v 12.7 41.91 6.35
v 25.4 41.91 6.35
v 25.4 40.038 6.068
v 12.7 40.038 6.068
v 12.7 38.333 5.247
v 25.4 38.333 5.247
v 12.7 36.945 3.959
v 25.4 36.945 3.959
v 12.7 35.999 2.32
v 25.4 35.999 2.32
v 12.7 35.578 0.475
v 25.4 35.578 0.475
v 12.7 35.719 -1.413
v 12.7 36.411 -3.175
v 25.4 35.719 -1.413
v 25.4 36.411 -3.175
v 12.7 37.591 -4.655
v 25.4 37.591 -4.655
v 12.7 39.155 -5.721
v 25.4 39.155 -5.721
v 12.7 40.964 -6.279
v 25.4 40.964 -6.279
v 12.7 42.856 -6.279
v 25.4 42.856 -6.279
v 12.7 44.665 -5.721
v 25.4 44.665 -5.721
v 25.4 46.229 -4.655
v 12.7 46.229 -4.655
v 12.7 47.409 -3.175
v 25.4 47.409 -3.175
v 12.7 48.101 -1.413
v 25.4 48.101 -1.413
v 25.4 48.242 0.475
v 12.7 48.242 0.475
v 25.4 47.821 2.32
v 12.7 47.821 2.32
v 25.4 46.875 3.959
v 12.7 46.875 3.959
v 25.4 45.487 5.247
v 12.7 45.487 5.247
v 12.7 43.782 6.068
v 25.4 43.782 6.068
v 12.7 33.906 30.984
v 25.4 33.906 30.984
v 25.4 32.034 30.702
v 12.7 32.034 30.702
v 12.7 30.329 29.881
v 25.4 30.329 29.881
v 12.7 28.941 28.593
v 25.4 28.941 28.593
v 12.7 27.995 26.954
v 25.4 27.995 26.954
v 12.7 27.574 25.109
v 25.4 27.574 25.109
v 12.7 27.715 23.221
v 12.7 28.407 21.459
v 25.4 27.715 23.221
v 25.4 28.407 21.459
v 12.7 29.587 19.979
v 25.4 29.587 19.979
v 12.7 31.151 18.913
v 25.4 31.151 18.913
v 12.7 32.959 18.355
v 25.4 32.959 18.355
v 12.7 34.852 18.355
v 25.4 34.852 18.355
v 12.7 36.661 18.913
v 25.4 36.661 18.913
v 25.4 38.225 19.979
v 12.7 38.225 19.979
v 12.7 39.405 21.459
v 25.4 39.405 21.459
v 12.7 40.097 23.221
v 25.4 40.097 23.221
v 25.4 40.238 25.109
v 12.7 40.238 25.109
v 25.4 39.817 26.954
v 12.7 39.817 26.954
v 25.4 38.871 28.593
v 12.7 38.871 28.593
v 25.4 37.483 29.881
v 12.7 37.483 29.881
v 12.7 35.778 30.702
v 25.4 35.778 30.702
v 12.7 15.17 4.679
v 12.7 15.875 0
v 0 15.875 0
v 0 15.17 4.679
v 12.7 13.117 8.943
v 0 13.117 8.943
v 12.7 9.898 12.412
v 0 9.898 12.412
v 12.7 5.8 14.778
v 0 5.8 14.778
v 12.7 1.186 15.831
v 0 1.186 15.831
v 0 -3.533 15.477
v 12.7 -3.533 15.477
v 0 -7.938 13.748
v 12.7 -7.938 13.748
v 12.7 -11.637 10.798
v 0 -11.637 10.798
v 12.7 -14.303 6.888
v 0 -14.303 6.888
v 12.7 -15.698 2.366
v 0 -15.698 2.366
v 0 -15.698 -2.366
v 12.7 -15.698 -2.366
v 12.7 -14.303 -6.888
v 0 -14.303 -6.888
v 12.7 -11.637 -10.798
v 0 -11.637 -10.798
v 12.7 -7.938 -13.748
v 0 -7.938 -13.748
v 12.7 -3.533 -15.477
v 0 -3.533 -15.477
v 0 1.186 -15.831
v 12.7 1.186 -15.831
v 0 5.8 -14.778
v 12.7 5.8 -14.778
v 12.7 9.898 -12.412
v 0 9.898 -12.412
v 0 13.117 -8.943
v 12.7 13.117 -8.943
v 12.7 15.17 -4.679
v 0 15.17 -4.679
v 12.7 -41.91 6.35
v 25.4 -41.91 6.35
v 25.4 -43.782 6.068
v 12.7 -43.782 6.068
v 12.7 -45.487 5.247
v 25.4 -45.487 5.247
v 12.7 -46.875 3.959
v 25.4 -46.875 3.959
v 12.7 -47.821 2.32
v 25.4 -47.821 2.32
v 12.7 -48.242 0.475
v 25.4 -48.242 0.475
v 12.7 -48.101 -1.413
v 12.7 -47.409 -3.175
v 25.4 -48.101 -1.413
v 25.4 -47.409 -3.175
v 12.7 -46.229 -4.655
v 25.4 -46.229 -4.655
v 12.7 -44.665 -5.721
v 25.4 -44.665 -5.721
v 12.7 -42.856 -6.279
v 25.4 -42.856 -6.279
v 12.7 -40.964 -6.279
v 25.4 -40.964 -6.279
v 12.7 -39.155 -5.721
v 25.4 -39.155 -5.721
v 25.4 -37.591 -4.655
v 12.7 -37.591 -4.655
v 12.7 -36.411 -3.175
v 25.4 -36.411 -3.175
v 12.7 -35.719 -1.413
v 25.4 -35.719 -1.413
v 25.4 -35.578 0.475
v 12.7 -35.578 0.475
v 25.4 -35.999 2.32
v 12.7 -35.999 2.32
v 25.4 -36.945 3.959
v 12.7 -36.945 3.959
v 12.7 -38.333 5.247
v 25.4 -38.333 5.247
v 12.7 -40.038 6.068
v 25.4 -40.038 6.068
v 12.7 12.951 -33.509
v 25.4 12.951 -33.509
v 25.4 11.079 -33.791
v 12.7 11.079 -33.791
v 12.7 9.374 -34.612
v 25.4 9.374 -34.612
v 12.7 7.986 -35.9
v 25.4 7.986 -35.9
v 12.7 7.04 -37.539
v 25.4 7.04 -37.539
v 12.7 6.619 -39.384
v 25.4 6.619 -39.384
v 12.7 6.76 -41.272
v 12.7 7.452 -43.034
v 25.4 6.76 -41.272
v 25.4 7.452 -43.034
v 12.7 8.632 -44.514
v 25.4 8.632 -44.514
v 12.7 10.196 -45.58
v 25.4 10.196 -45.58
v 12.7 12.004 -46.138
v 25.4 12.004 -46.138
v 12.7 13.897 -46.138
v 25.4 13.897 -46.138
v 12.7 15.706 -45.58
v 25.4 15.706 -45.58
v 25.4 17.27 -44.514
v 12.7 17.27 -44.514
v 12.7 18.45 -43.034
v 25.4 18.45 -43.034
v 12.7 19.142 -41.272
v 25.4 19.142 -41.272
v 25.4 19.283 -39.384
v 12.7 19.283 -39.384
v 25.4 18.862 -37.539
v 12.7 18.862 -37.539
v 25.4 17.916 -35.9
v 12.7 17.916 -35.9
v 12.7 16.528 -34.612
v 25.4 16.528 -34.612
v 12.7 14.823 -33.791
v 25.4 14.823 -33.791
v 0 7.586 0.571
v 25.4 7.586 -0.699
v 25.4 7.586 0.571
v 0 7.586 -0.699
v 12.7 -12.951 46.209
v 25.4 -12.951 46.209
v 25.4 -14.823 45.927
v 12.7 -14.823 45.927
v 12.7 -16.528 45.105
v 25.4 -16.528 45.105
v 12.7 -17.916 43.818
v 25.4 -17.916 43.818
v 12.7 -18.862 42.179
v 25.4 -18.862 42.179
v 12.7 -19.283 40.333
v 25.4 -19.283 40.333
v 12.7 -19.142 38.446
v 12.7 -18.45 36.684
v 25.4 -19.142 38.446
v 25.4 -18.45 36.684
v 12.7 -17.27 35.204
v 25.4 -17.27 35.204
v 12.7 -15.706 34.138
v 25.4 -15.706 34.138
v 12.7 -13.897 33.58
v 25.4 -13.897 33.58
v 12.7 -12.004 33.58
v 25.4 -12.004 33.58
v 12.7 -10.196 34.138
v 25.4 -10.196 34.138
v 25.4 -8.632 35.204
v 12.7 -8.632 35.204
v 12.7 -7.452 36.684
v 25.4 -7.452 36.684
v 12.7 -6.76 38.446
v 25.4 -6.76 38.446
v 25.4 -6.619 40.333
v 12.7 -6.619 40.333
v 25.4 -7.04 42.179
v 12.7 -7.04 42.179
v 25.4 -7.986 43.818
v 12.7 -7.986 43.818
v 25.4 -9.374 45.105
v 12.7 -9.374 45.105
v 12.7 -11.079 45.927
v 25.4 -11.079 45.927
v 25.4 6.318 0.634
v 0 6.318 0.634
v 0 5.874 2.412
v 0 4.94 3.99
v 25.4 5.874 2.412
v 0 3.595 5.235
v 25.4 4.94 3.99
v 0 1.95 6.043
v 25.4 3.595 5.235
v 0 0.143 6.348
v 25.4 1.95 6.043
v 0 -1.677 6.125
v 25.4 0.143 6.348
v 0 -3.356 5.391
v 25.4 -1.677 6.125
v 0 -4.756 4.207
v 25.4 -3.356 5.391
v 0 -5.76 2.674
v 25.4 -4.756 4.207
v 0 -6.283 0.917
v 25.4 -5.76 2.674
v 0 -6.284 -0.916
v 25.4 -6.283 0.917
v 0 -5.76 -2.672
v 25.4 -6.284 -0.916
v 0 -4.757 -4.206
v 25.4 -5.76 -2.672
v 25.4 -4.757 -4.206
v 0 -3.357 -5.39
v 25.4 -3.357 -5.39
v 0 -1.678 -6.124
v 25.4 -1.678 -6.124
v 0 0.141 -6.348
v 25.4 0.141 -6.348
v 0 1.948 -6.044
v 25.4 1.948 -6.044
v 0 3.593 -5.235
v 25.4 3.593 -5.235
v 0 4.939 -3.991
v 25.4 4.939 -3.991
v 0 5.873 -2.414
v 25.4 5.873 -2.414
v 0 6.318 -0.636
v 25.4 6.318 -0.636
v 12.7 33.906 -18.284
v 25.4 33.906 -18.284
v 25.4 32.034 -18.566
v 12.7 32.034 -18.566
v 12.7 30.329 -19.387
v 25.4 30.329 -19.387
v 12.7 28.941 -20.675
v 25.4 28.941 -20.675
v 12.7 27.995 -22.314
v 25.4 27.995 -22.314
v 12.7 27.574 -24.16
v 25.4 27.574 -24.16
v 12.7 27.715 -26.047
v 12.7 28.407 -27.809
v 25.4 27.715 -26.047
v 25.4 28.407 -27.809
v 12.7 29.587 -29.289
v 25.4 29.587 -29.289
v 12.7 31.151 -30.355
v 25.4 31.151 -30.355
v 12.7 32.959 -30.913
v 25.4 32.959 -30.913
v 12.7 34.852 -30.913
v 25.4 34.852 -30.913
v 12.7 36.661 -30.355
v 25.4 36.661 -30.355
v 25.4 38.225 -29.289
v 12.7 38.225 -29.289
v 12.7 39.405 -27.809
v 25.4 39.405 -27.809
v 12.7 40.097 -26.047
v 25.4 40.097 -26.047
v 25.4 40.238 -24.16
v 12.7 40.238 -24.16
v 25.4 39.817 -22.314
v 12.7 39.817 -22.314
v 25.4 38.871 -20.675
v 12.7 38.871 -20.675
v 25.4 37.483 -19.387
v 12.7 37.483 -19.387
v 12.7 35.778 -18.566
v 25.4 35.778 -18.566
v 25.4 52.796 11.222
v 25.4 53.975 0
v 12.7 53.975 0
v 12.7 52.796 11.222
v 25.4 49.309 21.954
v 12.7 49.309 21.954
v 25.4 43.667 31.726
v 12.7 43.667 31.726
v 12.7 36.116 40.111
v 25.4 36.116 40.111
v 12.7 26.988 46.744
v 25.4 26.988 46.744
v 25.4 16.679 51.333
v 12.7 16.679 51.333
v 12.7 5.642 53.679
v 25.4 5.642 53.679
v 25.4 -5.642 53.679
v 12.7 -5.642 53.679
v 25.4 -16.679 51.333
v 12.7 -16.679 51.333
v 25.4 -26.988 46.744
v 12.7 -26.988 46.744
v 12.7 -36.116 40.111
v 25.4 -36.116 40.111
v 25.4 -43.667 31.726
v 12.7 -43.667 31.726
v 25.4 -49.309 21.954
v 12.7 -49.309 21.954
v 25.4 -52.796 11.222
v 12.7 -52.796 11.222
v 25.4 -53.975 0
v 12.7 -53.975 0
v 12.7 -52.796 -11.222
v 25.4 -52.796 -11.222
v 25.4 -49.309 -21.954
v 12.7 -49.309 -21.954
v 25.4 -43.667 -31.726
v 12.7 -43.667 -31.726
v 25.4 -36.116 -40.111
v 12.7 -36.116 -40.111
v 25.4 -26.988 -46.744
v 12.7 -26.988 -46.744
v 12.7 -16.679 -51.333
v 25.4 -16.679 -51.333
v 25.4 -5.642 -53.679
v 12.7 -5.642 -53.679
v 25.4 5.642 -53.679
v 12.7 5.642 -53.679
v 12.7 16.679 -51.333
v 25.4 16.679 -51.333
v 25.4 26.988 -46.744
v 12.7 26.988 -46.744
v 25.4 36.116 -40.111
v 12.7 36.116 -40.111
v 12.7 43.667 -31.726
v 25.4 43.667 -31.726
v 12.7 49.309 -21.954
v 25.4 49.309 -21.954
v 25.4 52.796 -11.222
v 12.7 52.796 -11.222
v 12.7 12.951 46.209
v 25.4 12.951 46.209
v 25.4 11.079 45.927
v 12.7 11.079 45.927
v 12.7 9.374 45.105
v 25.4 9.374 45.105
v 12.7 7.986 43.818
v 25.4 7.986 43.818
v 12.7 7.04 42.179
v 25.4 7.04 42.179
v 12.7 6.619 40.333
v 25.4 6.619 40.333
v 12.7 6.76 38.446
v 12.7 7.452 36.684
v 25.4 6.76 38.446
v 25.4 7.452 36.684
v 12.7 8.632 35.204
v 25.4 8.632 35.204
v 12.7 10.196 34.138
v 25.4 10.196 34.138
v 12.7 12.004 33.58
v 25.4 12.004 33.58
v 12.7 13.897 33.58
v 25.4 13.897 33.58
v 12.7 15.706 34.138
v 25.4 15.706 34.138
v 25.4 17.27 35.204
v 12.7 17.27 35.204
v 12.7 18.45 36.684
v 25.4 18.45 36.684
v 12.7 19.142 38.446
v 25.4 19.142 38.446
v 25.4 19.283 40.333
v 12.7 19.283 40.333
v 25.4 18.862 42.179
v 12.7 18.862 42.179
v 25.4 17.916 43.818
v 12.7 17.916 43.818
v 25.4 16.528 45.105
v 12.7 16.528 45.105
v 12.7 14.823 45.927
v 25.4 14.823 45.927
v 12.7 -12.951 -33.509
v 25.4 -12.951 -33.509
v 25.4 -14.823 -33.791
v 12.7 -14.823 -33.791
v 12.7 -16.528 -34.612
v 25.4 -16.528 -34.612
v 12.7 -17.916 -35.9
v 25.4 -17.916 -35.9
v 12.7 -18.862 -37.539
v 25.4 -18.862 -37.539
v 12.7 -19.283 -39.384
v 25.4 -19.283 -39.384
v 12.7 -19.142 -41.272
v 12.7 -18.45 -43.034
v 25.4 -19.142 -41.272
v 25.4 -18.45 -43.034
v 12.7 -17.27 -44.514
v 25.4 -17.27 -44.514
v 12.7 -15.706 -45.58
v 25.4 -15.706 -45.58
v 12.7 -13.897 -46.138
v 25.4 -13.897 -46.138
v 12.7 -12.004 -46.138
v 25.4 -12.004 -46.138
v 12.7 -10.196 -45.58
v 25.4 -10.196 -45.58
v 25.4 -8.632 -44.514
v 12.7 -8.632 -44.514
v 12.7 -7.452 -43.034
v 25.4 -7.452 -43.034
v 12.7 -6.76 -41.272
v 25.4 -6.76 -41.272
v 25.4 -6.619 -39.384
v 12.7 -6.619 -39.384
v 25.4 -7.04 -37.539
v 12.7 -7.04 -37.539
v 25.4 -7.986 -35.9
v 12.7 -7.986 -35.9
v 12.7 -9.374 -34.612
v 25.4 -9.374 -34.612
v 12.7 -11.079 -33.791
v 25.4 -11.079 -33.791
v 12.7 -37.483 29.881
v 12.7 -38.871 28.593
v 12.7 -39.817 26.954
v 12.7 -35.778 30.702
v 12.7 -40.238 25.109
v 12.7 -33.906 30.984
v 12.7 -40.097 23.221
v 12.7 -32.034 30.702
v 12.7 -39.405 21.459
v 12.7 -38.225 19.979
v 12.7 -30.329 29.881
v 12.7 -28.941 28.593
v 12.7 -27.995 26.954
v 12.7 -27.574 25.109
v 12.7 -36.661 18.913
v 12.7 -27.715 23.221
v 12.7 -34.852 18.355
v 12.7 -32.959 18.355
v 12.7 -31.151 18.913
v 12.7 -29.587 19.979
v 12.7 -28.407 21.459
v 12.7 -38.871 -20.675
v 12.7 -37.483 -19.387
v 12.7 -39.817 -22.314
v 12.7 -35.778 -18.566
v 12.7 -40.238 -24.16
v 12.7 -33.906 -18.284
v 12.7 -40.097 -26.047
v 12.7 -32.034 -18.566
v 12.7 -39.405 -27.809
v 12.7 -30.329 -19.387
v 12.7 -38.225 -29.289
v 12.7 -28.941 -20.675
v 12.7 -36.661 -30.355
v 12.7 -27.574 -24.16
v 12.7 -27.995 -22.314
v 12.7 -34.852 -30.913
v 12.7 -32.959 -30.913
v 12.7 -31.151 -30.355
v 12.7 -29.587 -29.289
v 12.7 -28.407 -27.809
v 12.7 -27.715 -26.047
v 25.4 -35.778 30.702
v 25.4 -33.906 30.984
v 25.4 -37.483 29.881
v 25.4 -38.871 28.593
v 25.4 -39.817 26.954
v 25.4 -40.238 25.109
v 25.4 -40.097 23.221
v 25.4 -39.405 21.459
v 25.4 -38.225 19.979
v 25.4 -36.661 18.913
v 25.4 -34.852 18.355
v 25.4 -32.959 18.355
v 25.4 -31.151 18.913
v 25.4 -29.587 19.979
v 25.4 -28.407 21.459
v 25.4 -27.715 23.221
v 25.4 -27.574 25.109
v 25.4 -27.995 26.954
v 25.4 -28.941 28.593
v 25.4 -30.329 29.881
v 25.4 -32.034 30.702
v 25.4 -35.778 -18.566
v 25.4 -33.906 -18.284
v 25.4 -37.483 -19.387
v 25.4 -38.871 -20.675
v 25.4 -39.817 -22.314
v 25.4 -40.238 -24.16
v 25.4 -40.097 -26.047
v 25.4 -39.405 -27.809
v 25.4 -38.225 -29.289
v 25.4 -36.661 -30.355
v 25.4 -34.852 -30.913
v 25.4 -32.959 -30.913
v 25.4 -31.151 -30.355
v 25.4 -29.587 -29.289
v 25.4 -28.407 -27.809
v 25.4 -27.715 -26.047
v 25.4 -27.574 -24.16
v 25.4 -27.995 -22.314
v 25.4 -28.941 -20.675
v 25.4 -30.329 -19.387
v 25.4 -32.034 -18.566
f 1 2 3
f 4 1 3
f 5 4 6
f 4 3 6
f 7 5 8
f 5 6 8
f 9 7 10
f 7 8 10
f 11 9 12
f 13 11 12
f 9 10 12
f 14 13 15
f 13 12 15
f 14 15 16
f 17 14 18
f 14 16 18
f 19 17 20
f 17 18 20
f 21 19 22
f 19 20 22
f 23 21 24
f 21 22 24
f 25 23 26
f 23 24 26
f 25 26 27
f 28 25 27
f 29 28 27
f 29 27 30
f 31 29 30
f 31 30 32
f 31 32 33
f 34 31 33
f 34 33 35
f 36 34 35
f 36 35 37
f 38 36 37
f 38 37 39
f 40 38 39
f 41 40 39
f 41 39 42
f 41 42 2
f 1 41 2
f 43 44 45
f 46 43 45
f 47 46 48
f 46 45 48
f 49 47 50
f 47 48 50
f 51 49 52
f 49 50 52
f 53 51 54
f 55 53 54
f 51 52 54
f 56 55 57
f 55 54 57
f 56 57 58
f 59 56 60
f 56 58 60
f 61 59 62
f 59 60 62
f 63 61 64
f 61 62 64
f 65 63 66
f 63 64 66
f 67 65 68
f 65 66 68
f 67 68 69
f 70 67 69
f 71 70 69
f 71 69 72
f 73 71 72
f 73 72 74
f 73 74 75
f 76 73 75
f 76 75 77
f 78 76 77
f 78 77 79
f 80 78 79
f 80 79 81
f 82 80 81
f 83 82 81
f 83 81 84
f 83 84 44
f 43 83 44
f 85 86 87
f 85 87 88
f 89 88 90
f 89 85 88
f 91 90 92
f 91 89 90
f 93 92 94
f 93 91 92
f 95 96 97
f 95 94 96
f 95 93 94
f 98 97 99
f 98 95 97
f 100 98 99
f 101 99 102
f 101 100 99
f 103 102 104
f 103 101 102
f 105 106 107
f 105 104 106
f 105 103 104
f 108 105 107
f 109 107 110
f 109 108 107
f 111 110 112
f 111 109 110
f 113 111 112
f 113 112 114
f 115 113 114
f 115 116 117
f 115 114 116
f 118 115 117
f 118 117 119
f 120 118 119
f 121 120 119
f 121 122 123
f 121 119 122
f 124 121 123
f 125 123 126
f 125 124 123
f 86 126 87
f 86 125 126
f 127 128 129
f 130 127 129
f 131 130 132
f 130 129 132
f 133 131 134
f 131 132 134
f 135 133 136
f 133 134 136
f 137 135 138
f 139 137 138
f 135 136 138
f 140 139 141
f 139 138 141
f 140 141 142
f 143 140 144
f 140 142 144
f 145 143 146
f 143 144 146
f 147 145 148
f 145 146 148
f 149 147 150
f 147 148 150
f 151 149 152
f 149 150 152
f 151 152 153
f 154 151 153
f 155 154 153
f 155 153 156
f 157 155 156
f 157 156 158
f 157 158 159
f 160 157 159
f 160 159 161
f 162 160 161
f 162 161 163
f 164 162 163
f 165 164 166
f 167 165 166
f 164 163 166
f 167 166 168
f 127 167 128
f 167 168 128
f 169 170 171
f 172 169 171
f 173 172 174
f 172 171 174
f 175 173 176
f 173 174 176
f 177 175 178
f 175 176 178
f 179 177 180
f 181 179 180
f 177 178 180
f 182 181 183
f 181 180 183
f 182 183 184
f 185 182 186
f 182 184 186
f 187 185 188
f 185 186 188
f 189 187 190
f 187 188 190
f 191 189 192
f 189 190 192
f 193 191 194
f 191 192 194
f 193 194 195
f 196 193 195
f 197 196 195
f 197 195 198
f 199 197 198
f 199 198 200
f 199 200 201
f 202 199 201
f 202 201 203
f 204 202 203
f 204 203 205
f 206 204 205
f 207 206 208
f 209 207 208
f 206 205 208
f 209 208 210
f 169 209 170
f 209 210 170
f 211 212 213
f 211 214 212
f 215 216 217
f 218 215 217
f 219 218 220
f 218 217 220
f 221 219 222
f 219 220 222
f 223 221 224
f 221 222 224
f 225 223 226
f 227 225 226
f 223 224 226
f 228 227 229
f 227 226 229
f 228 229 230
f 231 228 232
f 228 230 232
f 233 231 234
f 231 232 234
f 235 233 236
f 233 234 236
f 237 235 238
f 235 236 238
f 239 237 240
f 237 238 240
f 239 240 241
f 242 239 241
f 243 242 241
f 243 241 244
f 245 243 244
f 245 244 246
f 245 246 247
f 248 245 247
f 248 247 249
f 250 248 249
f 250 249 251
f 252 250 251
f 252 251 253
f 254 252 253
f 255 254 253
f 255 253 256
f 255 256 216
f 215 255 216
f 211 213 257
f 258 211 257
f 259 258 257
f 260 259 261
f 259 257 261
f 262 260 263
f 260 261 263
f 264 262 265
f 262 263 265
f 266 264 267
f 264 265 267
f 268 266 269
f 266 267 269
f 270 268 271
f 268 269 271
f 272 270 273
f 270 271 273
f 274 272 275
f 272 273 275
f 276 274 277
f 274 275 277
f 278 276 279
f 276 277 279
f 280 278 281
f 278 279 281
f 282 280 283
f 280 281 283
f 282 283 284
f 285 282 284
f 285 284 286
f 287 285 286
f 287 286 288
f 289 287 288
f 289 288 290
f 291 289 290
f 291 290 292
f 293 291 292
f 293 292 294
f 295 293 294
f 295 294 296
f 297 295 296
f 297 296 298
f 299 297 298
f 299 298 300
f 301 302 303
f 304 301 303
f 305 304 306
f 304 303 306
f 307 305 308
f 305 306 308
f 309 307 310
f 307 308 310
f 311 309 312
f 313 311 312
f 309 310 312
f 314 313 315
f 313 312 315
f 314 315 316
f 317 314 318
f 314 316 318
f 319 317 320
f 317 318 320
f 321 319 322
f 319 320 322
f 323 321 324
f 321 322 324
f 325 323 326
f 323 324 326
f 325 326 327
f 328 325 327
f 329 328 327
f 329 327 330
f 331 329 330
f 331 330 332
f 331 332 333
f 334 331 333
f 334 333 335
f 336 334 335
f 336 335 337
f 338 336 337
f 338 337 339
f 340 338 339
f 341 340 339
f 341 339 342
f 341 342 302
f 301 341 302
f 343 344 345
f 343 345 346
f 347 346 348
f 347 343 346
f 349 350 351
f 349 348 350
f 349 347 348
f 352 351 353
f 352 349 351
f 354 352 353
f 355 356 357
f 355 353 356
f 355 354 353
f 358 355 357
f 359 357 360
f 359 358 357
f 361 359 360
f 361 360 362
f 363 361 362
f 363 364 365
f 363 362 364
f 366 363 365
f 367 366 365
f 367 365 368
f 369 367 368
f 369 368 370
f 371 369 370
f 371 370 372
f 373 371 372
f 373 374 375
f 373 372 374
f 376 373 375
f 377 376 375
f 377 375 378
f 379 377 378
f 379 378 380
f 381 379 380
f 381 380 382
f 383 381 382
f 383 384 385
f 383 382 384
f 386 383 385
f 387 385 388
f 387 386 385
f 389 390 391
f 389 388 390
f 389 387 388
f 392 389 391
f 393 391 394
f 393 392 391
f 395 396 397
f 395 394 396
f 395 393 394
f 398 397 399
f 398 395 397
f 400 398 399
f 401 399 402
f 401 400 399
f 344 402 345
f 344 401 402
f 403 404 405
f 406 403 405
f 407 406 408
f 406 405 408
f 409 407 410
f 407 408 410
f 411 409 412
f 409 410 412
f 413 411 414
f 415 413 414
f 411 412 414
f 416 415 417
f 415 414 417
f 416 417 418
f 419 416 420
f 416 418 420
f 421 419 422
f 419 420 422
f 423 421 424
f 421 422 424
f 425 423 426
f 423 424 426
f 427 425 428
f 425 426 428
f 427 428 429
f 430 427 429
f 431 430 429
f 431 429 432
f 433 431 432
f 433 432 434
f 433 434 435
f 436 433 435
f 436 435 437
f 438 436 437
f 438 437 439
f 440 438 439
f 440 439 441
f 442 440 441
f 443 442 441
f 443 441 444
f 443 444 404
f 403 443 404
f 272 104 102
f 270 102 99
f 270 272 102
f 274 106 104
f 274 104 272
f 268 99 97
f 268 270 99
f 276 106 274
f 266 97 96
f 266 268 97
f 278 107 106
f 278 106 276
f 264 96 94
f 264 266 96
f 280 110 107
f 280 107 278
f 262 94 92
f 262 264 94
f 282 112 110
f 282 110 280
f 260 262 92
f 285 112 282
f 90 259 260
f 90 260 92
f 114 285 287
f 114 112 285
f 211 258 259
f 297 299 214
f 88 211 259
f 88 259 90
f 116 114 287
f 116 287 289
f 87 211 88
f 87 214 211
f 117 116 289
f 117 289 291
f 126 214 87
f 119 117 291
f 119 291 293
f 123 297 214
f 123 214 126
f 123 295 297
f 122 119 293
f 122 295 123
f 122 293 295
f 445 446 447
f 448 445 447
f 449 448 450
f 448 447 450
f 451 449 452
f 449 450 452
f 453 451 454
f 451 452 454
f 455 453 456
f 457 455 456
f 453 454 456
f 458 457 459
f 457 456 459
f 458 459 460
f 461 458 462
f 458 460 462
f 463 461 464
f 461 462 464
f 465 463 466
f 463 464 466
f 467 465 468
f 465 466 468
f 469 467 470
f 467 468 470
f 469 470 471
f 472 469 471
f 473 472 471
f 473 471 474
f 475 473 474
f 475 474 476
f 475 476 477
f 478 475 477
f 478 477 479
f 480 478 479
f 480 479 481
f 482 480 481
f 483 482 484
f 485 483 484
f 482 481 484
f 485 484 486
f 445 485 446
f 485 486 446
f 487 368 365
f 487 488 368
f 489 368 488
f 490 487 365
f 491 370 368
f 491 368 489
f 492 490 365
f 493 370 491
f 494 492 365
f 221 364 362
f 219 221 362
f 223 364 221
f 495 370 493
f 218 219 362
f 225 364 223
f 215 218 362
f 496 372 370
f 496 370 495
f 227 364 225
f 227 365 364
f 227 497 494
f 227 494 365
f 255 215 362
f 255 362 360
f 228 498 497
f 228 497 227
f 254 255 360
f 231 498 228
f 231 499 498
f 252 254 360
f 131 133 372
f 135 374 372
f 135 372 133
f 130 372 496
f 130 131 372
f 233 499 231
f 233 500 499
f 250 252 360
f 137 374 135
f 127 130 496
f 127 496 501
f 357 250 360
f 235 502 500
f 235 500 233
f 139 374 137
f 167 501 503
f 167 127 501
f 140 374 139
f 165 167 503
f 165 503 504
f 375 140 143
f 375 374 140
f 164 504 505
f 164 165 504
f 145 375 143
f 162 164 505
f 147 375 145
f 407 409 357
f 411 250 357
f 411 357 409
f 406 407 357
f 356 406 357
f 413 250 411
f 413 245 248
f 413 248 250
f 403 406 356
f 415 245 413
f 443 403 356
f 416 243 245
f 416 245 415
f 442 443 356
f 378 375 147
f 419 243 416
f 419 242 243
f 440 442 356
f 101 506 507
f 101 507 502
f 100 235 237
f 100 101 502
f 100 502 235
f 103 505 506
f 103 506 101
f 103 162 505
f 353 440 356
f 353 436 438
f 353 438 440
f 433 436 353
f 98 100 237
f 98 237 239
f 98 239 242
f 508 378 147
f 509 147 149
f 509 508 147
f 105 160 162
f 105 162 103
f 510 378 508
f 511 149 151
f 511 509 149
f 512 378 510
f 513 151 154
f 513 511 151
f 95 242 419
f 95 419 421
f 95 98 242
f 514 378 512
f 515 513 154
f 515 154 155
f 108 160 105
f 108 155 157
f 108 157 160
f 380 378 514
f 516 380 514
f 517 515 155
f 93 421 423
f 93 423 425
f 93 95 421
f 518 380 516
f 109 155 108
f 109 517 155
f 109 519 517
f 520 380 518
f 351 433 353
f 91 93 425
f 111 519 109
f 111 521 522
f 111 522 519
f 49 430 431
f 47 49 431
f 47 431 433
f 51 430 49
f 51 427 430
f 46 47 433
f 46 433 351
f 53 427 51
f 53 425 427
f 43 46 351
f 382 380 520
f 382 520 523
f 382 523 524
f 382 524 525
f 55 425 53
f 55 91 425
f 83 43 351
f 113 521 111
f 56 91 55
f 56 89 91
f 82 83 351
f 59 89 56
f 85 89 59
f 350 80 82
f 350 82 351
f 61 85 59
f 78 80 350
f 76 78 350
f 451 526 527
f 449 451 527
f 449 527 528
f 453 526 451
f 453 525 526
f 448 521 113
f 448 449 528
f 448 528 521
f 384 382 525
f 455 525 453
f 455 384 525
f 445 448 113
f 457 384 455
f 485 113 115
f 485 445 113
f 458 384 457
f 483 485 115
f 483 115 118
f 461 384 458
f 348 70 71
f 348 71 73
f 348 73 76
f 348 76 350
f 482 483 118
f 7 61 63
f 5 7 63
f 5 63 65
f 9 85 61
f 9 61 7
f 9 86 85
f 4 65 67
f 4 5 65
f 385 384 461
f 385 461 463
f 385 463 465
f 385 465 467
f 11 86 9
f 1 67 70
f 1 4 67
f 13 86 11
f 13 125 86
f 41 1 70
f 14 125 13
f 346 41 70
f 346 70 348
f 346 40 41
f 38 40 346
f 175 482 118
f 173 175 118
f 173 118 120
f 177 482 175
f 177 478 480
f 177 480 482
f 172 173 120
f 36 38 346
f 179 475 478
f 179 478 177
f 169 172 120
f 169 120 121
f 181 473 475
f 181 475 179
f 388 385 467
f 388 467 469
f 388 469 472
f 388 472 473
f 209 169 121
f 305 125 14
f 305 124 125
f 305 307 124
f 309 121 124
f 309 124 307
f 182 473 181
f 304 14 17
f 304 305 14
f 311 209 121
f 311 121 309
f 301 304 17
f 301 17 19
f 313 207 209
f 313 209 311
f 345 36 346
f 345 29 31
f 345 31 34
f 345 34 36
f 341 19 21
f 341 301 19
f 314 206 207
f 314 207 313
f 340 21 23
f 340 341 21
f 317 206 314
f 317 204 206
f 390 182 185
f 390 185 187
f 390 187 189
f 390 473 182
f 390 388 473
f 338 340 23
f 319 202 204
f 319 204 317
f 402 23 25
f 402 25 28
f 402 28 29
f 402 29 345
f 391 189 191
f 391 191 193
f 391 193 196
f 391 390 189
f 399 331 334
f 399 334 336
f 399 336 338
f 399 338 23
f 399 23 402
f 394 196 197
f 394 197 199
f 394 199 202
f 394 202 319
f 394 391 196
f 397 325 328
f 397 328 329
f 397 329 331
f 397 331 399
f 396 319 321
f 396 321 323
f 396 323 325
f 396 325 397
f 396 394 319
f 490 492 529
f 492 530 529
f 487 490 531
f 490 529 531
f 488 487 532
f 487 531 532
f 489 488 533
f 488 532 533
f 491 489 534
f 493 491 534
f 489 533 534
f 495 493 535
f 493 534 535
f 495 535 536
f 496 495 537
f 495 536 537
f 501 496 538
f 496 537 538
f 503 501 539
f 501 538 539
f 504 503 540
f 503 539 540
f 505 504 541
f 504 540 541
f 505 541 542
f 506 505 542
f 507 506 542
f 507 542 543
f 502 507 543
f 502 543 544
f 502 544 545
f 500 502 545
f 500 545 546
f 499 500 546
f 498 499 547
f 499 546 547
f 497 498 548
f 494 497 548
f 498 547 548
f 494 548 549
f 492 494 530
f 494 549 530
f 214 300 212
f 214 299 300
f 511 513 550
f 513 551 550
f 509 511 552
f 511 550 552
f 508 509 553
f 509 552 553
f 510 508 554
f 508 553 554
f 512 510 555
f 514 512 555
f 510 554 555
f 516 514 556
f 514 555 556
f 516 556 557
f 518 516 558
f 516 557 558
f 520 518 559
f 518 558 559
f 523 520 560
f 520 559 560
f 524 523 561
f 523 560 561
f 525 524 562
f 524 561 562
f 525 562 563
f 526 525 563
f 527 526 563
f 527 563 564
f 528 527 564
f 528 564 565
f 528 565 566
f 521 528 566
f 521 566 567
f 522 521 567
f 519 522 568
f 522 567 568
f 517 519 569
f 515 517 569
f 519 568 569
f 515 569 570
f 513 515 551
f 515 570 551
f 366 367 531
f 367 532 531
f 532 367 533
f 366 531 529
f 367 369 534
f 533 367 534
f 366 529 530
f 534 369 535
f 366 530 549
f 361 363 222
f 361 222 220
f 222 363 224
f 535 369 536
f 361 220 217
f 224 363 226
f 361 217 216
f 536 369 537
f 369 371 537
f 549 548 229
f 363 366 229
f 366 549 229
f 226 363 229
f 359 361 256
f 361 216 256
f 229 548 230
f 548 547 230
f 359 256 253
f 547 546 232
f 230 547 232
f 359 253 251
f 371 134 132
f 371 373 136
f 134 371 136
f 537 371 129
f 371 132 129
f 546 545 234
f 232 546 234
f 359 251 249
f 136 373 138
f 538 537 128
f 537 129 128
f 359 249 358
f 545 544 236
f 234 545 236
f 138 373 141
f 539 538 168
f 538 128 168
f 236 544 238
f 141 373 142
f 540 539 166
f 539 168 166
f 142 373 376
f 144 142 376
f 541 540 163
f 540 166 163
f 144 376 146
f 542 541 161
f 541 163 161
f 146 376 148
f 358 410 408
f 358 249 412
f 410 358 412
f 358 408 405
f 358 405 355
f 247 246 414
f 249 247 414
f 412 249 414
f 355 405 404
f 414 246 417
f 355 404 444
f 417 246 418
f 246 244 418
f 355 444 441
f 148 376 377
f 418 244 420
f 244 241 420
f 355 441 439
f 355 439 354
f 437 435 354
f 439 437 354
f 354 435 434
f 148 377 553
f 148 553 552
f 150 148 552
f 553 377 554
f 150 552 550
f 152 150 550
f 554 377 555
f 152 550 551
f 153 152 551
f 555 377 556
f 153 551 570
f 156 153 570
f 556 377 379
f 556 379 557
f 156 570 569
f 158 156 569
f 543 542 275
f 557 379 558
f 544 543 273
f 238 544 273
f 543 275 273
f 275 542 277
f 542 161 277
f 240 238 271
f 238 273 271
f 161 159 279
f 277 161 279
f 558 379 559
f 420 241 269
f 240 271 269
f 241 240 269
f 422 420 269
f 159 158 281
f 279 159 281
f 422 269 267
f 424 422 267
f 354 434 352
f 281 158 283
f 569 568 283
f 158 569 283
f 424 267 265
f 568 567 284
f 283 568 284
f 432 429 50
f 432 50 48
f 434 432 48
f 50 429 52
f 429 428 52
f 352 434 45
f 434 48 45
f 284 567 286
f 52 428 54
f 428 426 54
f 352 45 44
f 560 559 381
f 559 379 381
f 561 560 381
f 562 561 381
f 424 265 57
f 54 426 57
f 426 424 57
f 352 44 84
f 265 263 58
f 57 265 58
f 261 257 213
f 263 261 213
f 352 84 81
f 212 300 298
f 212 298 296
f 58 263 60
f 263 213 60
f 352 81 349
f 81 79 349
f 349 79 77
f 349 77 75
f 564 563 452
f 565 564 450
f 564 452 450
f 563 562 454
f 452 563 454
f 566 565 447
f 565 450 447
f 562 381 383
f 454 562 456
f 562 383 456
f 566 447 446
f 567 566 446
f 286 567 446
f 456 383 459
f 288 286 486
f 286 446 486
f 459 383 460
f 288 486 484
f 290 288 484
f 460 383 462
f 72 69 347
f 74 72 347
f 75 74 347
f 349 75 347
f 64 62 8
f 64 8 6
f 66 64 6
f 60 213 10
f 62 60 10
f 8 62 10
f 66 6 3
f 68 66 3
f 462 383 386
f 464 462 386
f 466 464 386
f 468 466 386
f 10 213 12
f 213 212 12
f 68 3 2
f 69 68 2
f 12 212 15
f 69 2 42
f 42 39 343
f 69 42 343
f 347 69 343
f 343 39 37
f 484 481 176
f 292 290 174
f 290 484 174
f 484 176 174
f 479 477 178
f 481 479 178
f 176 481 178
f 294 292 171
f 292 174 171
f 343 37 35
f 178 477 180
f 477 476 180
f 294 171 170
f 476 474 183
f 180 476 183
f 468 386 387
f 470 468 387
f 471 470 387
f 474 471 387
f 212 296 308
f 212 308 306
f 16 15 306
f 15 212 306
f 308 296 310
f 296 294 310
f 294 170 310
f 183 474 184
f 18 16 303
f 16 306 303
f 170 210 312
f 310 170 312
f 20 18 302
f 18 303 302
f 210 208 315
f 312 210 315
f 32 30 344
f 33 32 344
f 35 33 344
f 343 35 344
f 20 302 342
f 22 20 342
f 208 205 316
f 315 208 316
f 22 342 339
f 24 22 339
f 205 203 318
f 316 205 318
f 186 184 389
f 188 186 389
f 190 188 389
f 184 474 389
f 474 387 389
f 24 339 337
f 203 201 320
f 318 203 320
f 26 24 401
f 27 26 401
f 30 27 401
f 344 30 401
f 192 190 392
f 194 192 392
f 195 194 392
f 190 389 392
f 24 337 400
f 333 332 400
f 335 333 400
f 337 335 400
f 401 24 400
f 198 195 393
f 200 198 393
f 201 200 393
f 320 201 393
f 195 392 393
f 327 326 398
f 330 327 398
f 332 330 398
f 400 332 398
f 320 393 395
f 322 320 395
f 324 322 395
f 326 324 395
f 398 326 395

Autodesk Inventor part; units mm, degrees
ref_plane "YZ Plane" through (0, 0, 0) normal (1, 0, 0) x (0, 1, 0)
ref_plane "XZ Plane" through (0, 0, 0) normal (0, 1, 0) x (-1, 0, 0)
ref_plane "XY Plane" through (0, 0, 0) normal (0, 0, 1) x (1, 0, 0)
sketch "Sketch1" plane through (0, 0, 0) normal (0, 0, 1) x (1, 0, 0)
  line L0 (0, 0) -> (0, 15.875)
  line L1 (0, 15.875) -> (12.7, 15.875)
  line L2 (12.7, 15.875) -> (12.7, 53.975)
  line L3 (12.7, 53.975) -> (25.4, 53.975)
  line L4 (25.4, 53.975) -> (25.4, 0)
  line L5 (25.4, 0) -> (0, 0)
  dimension "d0" = 15.875
  dimension "d1" = 12.7
  dimension "d2" = 38.1
  dimension "d3" = 12.7
revolve "Revolution1" add sketch "Sketch1" angle 360 about axis through (25.4, 0, 0) along (-1, 0, 0)
sketch "Sketch2" plane through (0, 0, 0) normal (-1, 0, 0) x (0, 0, 1)
  point P0 (0, 0)
  point P1 (0, 0)
hole "Hole1" at (0, 0, 0) direction (1, 0, 0) diameter 12.7 end through all
sketch "Sketch3" plane through (12.7, 0, 0) normal (-1, 0, 0) x (0, 0, 1)
  circle A0 centre (0, 0) radius 41.91 construction
  point P0 (0, 83.82)
  point P1 (0, 41.91)
  point P2 (-24.6341, 33.9059)
  point P3 (-39.8588, 12.9509)
  point P4 (-39.8588, -12.9509)
  point P5 (-24.6341, -33.9059)
  point P6 (0, -41.91)
  point P7 (24.6341, -33.9059)
  point P8 (39.8588, -12.9509)
  point P9 (39.8588, 12.9509)
  point P10 (24.6341, 33.9059)
  dimension "d13" = 83.82
  dimension "d16" = 360
hole "Hole2" at (12.7, 83.82, 0) at (12.7, 41.91, 0) at (12.7, 33.9059, -24.6341) at (12.7, 12.9509, -39.8588) at (12.7, -12.9509, -39.8588) at (12.7, -33.9059, -24.6341) at (12.7, -41.91, 0) at (12.7, -33.9059, 24.6341) at (12.7, -12.9509, 39.8588) at (12.7, 12.9509, 39.8588) at (12.7, 33.9059, 24.6341) direction (1, 0, 0) diameter 12.7 end through all
sketch "Sketch4" plane through (0, 0, 0) normal (-1, 0, 0) x (0, 0, 1)
  circle A0 centre (0, 0) radius 6.35 projected
  line L0 (0, 0) -> (0, 10.0164) construction
  line L1 (0, 6.35) -> (0.6342, 6.3182)
  line L2 (0, 6.35) -> (-0.6358, 6.3181)
  line L3 (-0.6358, 6.3181) -> (-0.6994, 7.5865)
  line L4 (-0.6994, 7.5865) -> (0.5706, 7.5865)
  line L5 (0.5706, 7.5865) -> (0.6342, 6.3182)
  dimension "d27" = 0.635
  dimension "d28" = 1.27
  dimension "d29" = 1.27
extrude "Extrusion1" cut sketch "Sketch4" against normal up to next contours A0 L3 L4 L5
properties part number "CircularPattern"
